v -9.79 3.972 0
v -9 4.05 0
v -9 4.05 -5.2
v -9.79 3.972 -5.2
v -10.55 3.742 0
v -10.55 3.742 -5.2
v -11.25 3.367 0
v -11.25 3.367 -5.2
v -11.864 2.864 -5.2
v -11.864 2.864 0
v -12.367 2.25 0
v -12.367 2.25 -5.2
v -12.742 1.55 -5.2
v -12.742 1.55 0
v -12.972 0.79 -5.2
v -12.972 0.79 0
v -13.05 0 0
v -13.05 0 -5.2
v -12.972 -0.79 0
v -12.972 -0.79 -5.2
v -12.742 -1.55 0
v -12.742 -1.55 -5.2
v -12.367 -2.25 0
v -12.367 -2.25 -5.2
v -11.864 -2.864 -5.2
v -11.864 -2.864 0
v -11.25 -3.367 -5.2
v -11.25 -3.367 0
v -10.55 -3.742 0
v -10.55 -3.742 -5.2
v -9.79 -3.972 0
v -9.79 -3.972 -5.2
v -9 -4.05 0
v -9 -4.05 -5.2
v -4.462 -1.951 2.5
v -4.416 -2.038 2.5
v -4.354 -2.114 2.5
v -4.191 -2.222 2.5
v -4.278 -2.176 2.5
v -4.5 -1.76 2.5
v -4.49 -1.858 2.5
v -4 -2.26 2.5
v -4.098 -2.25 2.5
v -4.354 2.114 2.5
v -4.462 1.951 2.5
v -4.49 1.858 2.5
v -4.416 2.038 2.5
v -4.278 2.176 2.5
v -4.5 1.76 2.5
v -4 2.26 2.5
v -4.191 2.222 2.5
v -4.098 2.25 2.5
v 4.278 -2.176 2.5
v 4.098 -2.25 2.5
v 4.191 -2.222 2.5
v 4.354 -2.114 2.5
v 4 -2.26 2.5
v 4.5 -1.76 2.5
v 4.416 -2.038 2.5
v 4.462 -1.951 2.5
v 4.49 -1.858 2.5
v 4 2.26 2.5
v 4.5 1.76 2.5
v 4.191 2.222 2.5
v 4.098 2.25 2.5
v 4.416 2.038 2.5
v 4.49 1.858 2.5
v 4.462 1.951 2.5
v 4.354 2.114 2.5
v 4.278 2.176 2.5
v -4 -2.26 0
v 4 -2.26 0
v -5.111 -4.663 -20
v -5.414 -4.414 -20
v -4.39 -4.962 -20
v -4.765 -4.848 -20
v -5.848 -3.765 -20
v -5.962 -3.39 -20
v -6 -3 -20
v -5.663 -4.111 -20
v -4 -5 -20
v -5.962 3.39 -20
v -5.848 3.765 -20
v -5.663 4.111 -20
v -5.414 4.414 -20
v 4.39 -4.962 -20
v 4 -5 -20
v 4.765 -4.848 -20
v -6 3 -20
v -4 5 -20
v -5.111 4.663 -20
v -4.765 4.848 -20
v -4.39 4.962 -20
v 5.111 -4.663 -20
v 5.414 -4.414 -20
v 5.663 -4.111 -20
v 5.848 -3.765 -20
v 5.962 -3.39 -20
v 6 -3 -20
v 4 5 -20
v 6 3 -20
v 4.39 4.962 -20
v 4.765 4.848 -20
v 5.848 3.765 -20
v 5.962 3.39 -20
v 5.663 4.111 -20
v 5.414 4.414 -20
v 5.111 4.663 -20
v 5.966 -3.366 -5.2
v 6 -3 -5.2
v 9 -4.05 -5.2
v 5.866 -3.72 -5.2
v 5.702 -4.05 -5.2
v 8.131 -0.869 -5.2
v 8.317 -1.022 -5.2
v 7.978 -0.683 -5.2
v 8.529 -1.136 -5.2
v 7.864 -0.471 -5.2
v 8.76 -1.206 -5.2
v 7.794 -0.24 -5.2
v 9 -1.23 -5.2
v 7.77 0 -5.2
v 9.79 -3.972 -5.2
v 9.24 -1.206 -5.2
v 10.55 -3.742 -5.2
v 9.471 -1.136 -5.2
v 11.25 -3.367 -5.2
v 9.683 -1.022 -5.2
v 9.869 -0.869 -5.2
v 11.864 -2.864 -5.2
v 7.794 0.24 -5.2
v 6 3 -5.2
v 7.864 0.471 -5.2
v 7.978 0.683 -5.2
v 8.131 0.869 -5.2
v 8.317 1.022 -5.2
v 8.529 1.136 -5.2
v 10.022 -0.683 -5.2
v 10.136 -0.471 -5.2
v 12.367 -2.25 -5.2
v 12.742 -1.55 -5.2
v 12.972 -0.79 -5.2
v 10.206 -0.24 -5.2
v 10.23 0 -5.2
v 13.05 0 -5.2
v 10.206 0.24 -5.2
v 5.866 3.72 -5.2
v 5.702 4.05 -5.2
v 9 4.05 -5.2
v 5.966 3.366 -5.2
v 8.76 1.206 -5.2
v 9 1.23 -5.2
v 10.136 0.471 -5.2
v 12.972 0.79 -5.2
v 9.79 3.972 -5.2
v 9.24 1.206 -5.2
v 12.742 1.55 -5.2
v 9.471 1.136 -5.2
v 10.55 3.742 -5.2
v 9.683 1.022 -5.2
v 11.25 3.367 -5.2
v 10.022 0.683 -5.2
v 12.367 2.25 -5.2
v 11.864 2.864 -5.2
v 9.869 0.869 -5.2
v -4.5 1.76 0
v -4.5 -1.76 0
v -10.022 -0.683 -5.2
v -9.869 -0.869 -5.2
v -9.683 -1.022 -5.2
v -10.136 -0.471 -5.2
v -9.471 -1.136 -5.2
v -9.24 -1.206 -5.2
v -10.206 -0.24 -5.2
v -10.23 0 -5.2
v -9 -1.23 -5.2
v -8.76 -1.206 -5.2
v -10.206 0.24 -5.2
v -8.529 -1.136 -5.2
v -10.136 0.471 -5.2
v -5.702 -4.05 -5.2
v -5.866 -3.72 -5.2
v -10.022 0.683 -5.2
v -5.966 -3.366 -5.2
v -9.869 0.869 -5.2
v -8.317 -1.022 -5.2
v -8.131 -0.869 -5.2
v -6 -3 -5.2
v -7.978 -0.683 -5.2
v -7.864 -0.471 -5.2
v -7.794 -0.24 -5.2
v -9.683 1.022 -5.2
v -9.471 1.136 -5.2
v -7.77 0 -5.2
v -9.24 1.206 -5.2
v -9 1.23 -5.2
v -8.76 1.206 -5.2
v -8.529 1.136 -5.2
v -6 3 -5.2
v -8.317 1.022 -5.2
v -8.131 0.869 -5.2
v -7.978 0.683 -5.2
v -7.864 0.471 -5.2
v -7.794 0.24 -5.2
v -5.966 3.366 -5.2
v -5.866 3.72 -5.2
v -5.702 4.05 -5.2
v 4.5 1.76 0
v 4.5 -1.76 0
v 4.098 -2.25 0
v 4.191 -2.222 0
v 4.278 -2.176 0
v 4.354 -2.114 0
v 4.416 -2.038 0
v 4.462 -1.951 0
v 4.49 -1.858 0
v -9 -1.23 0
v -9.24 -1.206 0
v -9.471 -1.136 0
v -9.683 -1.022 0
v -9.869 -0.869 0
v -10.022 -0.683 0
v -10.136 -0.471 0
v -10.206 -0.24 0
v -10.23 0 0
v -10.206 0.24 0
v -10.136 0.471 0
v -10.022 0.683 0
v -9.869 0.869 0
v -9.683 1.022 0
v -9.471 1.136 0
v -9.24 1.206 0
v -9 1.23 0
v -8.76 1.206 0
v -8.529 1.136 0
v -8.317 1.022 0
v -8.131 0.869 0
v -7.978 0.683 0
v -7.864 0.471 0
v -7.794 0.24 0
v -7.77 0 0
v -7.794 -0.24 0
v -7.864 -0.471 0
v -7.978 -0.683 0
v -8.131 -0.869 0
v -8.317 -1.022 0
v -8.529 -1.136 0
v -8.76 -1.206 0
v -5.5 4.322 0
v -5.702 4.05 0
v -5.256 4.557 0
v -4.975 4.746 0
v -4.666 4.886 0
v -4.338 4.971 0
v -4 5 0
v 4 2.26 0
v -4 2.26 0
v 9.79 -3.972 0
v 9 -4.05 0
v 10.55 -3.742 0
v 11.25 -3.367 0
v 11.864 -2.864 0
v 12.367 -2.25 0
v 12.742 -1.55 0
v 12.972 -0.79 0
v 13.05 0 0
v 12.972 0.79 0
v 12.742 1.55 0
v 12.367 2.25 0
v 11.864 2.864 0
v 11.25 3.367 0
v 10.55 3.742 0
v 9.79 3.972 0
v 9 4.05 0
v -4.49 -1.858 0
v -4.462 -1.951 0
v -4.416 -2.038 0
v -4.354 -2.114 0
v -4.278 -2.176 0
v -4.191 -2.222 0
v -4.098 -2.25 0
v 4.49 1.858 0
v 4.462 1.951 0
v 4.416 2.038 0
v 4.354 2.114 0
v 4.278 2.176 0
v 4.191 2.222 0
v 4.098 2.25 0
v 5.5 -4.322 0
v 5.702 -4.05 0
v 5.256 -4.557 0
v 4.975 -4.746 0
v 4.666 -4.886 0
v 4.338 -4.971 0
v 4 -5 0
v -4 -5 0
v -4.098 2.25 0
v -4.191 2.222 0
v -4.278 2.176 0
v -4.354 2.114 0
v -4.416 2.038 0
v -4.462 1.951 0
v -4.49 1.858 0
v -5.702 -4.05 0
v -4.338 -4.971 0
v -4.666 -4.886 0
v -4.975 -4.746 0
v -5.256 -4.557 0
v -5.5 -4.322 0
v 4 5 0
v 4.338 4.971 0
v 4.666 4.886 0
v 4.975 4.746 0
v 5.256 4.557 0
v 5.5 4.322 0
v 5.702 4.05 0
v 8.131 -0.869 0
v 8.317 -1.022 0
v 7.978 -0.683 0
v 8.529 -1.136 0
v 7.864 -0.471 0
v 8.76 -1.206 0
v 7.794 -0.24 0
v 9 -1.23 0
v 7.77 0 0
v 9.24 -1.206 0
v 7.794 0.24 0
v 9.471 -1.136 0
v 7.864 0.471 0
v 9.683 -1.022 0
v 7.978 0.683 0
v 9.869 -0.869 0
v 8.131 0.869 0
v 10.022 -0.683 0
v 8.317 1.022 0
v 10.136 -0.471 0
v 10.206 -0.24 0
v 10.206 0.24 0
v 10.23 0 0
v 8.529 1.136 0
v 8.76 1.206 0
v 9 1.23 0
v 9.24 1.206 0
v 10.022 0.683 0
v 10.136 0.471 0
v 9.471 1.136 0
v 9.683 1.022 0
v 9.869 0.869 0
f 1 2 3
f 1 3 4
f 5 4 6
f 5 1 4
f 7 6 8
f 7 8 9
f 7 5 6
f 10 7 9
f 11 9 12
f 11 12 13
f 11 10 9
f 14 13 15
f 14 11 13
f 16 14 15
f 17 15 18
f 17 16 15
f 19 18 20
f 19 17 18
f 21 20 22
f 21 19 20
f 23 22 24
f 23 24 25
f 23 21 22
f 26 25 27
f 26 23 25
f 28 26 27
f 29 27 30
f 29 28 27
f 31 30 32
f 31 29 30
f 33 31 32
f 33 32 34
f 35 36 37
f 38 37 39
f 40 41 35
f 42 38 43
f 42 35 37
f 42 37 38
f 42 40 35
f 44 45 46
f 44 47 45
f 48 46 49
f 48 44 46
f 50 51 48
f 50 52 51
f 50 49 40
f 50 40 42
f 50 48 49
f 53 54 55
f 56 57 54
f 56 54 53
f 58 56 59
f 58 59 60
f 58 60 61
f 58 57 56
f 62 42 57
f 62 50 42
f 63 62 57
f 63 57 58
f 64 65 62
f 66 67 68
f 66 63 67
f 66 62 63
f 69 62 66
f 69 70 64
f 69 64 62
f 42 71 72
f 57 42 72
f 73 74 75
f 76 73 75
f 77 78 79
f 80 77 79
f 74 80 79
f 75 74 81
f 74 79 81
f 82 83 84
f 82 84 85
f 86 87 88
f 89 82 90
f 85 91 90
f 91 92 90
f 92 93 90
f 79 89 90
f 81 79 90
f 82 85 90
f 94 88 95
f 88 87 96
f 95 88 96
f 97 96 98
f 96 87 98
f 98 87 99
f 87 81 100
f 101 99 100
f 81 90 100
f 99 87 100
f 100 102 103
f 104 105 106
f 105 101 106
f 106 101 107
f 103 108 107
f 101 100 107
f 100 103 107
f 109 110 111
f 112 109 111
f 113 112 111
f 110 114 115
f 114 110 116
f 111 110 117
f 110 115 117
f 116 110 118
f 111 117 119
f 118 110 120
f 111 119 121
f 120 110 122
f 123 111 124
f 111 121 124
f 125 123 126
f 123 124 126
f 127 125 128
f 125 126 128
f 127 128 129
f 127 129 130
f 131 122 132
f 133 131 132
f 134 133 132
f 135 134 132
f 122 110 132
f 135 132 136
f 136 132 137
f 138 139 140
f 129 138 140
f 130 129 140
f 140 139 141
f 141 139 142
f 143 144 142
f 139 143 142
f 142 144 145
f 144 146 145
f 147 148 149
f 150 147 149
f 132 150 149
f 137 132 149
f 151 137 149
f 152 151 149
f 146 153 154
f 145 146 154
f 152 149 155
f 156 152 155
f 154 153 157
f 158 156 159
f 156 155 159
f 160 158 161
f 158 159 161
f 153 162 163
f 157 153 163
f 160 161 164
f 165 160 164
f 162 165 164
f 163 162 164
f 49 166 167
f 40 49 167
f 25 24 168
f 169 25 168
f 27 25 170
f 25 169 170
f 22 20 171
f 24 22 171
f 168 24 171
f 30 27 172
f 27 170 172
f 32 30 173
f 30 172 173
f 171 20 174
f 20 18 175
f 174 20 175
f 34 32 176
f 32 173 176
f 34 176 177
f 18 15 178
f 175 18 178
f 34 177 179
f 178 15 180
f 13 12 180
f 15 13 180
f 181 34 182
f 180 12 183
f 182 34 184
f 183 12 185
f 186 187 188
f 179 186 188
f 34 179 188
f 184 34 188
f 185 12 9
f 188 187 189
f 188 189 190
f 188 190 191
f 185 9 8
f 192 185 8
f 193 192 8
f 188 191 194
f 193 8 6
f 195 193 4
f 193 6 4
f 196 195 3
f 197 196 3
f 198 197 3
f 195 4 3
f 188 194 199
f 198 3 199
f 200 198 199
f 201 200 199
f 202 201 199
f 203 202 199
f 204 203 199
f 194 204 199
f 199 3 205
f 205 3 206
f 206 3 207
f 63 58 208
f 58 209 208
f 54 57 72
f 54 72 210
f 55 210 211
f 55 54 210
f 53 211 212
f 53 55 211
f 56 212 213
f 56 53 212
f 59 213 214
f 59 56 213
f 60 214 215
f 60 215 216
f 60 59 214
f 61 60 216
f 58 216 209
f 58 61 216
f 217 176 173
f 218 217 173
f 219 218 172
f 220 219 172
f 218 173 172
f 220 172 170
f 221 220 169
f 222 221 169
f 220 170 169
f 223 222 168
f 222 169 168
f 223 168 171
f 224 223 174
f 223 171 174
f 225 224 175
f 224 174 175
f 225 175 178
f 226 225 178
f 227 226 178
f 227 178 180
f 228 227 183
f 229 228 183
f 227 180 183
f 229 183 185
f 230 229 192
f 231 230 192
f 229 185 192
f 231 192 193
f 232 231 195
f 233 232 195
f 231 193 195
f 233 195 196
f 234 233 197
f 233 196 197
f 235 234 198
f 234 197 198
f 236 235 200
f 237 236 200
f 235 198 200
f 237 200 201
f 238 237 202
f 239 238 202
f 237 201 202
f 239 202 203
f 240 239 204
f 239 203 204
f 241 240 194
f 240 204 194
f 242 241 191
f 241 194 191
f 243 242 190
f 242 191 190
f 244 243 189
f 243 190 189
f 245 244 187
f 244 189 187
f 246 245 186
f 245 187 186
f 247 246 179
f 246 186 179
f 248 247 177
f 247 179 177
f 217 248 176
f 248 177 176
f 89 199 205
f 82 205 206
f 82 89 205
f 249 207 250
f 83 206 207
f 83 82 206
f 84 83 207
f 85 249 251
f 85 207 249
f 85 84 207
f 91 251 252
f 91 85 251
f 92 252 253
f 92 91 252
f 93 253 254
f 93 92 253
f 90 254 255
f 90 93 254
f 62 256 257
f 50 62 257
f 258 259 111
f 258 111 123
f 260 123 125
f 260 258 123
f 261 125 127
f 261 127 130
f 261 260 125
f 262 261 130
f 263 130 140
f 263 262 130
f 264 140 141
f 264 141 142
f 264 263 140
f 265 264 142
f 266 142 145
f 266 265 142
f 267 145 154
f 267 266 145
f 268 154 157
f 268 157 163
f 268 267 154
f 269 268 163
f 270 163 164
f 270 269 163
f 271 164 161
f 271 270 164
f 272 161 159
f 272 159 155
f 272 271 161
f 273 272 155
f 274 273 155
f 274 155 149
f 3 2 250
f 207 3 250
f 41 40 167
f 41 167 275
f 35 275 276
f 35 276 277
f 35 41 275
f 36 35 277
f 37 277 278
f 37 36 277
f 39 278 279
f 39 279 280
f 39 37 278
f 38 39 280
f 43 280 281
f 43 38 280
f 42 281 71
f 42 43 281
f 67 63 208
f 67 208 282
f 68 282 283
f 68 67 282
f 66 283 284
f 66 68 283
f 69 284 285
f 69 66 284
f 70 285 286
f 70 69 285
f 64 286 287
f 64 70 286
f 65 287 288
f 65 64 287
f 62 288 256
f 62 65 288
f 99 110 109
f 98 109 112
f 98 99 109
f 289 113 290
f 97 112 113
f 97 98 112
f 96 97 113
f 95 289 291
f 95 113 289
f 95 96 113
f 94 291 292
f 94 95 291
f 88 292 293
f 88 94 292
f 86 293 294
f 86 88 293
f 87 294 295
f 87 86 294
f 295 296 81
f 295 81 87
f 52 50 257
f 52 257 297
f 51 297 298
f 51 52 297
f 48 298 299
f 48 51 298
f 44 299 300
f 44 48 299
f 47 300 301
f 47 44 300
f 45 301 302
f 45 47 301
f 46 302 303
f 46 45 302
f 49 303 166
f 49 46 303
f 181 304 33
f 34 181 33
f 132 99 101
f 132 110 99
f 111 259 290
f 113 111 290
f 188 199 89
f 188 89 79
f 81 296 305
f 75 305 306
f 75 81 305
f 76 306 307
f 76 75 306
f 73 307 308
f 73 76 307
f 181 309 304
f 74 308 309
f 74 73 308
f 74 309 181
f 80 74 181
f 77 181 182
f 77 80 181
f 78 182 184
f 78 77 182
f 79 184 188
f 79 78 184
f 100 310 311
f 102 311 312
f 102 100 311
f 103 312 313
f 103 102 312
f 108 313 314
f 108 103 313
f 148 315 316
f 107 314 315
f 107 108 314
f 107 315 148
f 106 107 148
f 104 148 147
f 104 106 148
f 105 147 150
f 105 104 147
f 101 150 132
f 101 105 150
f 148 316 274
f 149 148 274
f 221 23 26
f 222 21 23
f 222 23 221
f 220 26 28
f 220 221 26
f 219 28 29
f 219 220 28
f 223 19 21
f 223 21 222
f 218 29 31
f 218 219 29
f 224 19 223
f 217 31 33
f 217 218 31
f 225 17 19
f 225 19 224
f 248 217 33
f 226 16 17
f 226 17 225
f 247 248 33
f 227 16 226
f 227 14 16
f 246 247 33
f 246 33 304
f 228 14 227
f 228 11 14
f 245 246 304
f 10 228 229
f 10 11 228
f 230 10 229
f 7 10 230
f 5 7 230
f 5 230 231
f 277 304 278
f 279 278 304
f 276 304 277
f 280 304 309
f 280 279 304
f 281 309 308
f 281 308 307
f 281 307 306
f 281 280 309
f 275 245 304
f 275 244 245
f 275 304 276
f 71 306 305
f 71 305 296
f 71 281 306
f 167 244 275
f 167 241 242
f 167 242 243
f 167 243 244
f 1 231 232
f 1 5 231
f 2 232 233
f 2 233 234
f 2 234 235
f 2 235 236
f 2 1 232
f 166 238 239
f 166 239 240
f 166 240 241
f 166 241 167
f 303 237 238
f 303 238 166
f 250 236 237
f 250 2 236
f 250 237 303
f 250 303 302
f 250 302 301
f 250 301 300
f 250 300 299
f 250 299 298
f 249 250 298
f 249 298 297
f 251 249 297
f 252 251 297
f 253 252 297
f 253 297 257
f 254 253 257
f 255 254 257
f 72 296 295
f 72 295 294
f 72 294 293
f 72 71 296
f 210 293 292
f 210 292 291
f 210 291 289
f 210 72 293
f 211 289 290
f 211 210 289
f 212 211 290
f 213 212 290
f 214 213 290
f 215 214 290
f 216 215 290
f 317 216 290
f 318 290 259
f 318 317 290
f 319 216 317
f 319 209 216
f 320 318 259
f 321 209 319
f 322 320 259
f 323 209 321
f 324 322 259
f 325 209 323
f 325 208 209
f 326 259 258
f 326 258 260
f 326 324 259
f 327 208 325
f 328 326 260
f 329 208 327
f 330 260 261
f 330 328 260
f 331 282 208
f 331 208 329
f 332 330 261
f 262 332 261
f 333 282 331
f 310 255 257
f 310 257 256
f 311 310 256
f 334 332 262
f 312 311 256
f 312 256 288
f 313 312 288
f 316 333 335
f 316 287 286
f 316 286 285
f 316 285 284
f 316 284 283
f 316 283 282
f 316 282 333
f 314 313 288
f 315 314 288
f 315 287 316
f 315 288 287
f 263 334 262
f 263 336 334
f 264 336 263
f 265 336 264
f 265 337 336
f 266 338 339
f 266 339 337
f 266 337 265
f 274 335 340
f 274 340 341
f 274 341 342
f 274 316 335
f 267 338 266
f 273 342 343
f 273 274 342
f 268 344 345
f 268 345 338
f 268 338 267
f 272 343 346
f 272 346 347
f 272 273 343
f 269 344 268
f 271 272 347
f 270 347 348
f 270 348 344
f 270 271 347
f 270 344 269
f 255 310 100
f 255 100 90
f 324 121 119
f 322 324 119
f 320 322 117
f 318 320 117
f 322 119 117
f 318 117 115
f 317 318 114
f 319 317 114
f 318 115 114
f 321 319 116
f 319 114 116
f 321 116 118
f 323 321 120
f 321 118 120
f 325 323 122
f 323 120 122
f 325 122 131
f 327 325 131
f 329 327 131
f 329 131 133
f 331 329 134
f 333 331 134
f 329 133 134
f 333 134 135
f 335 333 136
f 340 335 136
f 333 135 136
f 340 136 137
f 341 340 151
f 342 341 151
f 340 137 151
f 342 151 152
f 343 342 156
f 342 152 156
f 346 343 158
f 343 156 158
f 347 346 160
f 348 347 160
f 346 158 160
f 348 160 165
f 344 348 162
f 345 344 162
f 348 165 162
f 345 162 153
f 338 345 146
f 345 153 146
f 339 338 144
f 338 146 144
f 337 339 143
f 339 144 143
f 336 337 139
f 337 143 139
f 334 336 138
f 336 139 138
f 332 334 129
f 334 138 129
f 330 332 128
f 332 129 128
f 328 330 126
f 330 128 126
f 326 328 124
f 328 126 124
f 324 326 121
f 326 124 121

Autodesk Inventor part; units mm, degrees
ref_plane "YZ Plane" through (0, 0, 0) normal (1, 0, 0) x (0, 1, 0)
ref_plane "XZ Plane" through (0, 0, 0) normal (0, 1, 0) x (-1, 0, 0)
ref_plane "XY Plane" through (0, 0, 0) normal (0, 0, 1) x (1, 0, 0)
sketch "Sketch1" plane through (0, 0, 0) normal (0, 0, 1) x (1, 0, 0)
  line L0 (-4.5, -2.26) -> (4.5, -2.26)
  line L1 (4.5, -2.26) -> (4.5, 2.26)
  line L2 (4.5, 2.26) -> (-4.5, 2.26)
  line L3 (-4.5, 2.26) -> (-4.5, -2.26)
  line L4 (-4.5, -2.26) -> (4.5, 2.26) construction
  line L5 (4.5, -2.26) -> (-4.5, 2.26) construction
  point P0 (0, 0)
  dimension "d0" = 9
  dimension "d1" = 4.52
extrude "Extrusion1" add sketch "Sketch1" along normal blind 2.5
sketch "Sketch2" plane through (0, 0, 0) normal (0, 0, 1) x (1, 0, 0)
  line L0 (-6, -5) -> (6, -5)
  line L1 (6, -5) -> (6, 5)
  line L2 (6, 5) -> (-6, 5)
  line L3 (-6, 5) -> (-6, -5)
  line L4 (-6, -5) -> (6, 5) construction
  line L5 (6, -5) -> (-6, 5) construction
  point P0 (0, 0)
  dimension "d4" = 12
  dimension "d5" = 10
extrude "Extrusion2" add sketch "Sketch2" against normal blind 20
fillet "Fillet1" radius 2 4 edges at (-6, 5, -10) (6, 5, -10) (6, -5, -10) (-6, -5, -10)
sketch "Sketch3" plane through (0, 0, 0) normal (0, 0, 1) x (1, 0, 0)
  line L0 (-9, 0) -> (9, 0) construction
  circle A0 centre (-9, 0) radius 4.05
  circle A1 centre (9, 0) radius 4.05
  line L1 (-9, 4.05) -> (9, 4.05)
  line L2 (9, 4.05) -> (9, -4.05)
  line L3 (9, -4.05) -> (-9, -4.05)
  line L4 (-9, -4.05) -> (-9, 4.05)
  point P0 (0, 0)
  point P1 (0, 0)
  dimension "d10" = 8.1
  dimension "d9" = 18
extrude "Extrusion3" add sketch "Sketch3" against normal blind 5.2
hole "Hole1" at (-9, 0, 0) at (9, 0, 0) direction (0, 0, -1) diameter 2.459 end through all thread size "M3x0.5" class "6H" standard "ISO Metric profile"
fillet "Fillet2" radius 0.5 4 edges at (-4.5, 2.26, 1.25) (4.5, 2.26, 1.25) (4.5, -2.26, 1.25) (-4.5, -2.26, 1.25)
properties part number "103367_Panel_Side_USB"
